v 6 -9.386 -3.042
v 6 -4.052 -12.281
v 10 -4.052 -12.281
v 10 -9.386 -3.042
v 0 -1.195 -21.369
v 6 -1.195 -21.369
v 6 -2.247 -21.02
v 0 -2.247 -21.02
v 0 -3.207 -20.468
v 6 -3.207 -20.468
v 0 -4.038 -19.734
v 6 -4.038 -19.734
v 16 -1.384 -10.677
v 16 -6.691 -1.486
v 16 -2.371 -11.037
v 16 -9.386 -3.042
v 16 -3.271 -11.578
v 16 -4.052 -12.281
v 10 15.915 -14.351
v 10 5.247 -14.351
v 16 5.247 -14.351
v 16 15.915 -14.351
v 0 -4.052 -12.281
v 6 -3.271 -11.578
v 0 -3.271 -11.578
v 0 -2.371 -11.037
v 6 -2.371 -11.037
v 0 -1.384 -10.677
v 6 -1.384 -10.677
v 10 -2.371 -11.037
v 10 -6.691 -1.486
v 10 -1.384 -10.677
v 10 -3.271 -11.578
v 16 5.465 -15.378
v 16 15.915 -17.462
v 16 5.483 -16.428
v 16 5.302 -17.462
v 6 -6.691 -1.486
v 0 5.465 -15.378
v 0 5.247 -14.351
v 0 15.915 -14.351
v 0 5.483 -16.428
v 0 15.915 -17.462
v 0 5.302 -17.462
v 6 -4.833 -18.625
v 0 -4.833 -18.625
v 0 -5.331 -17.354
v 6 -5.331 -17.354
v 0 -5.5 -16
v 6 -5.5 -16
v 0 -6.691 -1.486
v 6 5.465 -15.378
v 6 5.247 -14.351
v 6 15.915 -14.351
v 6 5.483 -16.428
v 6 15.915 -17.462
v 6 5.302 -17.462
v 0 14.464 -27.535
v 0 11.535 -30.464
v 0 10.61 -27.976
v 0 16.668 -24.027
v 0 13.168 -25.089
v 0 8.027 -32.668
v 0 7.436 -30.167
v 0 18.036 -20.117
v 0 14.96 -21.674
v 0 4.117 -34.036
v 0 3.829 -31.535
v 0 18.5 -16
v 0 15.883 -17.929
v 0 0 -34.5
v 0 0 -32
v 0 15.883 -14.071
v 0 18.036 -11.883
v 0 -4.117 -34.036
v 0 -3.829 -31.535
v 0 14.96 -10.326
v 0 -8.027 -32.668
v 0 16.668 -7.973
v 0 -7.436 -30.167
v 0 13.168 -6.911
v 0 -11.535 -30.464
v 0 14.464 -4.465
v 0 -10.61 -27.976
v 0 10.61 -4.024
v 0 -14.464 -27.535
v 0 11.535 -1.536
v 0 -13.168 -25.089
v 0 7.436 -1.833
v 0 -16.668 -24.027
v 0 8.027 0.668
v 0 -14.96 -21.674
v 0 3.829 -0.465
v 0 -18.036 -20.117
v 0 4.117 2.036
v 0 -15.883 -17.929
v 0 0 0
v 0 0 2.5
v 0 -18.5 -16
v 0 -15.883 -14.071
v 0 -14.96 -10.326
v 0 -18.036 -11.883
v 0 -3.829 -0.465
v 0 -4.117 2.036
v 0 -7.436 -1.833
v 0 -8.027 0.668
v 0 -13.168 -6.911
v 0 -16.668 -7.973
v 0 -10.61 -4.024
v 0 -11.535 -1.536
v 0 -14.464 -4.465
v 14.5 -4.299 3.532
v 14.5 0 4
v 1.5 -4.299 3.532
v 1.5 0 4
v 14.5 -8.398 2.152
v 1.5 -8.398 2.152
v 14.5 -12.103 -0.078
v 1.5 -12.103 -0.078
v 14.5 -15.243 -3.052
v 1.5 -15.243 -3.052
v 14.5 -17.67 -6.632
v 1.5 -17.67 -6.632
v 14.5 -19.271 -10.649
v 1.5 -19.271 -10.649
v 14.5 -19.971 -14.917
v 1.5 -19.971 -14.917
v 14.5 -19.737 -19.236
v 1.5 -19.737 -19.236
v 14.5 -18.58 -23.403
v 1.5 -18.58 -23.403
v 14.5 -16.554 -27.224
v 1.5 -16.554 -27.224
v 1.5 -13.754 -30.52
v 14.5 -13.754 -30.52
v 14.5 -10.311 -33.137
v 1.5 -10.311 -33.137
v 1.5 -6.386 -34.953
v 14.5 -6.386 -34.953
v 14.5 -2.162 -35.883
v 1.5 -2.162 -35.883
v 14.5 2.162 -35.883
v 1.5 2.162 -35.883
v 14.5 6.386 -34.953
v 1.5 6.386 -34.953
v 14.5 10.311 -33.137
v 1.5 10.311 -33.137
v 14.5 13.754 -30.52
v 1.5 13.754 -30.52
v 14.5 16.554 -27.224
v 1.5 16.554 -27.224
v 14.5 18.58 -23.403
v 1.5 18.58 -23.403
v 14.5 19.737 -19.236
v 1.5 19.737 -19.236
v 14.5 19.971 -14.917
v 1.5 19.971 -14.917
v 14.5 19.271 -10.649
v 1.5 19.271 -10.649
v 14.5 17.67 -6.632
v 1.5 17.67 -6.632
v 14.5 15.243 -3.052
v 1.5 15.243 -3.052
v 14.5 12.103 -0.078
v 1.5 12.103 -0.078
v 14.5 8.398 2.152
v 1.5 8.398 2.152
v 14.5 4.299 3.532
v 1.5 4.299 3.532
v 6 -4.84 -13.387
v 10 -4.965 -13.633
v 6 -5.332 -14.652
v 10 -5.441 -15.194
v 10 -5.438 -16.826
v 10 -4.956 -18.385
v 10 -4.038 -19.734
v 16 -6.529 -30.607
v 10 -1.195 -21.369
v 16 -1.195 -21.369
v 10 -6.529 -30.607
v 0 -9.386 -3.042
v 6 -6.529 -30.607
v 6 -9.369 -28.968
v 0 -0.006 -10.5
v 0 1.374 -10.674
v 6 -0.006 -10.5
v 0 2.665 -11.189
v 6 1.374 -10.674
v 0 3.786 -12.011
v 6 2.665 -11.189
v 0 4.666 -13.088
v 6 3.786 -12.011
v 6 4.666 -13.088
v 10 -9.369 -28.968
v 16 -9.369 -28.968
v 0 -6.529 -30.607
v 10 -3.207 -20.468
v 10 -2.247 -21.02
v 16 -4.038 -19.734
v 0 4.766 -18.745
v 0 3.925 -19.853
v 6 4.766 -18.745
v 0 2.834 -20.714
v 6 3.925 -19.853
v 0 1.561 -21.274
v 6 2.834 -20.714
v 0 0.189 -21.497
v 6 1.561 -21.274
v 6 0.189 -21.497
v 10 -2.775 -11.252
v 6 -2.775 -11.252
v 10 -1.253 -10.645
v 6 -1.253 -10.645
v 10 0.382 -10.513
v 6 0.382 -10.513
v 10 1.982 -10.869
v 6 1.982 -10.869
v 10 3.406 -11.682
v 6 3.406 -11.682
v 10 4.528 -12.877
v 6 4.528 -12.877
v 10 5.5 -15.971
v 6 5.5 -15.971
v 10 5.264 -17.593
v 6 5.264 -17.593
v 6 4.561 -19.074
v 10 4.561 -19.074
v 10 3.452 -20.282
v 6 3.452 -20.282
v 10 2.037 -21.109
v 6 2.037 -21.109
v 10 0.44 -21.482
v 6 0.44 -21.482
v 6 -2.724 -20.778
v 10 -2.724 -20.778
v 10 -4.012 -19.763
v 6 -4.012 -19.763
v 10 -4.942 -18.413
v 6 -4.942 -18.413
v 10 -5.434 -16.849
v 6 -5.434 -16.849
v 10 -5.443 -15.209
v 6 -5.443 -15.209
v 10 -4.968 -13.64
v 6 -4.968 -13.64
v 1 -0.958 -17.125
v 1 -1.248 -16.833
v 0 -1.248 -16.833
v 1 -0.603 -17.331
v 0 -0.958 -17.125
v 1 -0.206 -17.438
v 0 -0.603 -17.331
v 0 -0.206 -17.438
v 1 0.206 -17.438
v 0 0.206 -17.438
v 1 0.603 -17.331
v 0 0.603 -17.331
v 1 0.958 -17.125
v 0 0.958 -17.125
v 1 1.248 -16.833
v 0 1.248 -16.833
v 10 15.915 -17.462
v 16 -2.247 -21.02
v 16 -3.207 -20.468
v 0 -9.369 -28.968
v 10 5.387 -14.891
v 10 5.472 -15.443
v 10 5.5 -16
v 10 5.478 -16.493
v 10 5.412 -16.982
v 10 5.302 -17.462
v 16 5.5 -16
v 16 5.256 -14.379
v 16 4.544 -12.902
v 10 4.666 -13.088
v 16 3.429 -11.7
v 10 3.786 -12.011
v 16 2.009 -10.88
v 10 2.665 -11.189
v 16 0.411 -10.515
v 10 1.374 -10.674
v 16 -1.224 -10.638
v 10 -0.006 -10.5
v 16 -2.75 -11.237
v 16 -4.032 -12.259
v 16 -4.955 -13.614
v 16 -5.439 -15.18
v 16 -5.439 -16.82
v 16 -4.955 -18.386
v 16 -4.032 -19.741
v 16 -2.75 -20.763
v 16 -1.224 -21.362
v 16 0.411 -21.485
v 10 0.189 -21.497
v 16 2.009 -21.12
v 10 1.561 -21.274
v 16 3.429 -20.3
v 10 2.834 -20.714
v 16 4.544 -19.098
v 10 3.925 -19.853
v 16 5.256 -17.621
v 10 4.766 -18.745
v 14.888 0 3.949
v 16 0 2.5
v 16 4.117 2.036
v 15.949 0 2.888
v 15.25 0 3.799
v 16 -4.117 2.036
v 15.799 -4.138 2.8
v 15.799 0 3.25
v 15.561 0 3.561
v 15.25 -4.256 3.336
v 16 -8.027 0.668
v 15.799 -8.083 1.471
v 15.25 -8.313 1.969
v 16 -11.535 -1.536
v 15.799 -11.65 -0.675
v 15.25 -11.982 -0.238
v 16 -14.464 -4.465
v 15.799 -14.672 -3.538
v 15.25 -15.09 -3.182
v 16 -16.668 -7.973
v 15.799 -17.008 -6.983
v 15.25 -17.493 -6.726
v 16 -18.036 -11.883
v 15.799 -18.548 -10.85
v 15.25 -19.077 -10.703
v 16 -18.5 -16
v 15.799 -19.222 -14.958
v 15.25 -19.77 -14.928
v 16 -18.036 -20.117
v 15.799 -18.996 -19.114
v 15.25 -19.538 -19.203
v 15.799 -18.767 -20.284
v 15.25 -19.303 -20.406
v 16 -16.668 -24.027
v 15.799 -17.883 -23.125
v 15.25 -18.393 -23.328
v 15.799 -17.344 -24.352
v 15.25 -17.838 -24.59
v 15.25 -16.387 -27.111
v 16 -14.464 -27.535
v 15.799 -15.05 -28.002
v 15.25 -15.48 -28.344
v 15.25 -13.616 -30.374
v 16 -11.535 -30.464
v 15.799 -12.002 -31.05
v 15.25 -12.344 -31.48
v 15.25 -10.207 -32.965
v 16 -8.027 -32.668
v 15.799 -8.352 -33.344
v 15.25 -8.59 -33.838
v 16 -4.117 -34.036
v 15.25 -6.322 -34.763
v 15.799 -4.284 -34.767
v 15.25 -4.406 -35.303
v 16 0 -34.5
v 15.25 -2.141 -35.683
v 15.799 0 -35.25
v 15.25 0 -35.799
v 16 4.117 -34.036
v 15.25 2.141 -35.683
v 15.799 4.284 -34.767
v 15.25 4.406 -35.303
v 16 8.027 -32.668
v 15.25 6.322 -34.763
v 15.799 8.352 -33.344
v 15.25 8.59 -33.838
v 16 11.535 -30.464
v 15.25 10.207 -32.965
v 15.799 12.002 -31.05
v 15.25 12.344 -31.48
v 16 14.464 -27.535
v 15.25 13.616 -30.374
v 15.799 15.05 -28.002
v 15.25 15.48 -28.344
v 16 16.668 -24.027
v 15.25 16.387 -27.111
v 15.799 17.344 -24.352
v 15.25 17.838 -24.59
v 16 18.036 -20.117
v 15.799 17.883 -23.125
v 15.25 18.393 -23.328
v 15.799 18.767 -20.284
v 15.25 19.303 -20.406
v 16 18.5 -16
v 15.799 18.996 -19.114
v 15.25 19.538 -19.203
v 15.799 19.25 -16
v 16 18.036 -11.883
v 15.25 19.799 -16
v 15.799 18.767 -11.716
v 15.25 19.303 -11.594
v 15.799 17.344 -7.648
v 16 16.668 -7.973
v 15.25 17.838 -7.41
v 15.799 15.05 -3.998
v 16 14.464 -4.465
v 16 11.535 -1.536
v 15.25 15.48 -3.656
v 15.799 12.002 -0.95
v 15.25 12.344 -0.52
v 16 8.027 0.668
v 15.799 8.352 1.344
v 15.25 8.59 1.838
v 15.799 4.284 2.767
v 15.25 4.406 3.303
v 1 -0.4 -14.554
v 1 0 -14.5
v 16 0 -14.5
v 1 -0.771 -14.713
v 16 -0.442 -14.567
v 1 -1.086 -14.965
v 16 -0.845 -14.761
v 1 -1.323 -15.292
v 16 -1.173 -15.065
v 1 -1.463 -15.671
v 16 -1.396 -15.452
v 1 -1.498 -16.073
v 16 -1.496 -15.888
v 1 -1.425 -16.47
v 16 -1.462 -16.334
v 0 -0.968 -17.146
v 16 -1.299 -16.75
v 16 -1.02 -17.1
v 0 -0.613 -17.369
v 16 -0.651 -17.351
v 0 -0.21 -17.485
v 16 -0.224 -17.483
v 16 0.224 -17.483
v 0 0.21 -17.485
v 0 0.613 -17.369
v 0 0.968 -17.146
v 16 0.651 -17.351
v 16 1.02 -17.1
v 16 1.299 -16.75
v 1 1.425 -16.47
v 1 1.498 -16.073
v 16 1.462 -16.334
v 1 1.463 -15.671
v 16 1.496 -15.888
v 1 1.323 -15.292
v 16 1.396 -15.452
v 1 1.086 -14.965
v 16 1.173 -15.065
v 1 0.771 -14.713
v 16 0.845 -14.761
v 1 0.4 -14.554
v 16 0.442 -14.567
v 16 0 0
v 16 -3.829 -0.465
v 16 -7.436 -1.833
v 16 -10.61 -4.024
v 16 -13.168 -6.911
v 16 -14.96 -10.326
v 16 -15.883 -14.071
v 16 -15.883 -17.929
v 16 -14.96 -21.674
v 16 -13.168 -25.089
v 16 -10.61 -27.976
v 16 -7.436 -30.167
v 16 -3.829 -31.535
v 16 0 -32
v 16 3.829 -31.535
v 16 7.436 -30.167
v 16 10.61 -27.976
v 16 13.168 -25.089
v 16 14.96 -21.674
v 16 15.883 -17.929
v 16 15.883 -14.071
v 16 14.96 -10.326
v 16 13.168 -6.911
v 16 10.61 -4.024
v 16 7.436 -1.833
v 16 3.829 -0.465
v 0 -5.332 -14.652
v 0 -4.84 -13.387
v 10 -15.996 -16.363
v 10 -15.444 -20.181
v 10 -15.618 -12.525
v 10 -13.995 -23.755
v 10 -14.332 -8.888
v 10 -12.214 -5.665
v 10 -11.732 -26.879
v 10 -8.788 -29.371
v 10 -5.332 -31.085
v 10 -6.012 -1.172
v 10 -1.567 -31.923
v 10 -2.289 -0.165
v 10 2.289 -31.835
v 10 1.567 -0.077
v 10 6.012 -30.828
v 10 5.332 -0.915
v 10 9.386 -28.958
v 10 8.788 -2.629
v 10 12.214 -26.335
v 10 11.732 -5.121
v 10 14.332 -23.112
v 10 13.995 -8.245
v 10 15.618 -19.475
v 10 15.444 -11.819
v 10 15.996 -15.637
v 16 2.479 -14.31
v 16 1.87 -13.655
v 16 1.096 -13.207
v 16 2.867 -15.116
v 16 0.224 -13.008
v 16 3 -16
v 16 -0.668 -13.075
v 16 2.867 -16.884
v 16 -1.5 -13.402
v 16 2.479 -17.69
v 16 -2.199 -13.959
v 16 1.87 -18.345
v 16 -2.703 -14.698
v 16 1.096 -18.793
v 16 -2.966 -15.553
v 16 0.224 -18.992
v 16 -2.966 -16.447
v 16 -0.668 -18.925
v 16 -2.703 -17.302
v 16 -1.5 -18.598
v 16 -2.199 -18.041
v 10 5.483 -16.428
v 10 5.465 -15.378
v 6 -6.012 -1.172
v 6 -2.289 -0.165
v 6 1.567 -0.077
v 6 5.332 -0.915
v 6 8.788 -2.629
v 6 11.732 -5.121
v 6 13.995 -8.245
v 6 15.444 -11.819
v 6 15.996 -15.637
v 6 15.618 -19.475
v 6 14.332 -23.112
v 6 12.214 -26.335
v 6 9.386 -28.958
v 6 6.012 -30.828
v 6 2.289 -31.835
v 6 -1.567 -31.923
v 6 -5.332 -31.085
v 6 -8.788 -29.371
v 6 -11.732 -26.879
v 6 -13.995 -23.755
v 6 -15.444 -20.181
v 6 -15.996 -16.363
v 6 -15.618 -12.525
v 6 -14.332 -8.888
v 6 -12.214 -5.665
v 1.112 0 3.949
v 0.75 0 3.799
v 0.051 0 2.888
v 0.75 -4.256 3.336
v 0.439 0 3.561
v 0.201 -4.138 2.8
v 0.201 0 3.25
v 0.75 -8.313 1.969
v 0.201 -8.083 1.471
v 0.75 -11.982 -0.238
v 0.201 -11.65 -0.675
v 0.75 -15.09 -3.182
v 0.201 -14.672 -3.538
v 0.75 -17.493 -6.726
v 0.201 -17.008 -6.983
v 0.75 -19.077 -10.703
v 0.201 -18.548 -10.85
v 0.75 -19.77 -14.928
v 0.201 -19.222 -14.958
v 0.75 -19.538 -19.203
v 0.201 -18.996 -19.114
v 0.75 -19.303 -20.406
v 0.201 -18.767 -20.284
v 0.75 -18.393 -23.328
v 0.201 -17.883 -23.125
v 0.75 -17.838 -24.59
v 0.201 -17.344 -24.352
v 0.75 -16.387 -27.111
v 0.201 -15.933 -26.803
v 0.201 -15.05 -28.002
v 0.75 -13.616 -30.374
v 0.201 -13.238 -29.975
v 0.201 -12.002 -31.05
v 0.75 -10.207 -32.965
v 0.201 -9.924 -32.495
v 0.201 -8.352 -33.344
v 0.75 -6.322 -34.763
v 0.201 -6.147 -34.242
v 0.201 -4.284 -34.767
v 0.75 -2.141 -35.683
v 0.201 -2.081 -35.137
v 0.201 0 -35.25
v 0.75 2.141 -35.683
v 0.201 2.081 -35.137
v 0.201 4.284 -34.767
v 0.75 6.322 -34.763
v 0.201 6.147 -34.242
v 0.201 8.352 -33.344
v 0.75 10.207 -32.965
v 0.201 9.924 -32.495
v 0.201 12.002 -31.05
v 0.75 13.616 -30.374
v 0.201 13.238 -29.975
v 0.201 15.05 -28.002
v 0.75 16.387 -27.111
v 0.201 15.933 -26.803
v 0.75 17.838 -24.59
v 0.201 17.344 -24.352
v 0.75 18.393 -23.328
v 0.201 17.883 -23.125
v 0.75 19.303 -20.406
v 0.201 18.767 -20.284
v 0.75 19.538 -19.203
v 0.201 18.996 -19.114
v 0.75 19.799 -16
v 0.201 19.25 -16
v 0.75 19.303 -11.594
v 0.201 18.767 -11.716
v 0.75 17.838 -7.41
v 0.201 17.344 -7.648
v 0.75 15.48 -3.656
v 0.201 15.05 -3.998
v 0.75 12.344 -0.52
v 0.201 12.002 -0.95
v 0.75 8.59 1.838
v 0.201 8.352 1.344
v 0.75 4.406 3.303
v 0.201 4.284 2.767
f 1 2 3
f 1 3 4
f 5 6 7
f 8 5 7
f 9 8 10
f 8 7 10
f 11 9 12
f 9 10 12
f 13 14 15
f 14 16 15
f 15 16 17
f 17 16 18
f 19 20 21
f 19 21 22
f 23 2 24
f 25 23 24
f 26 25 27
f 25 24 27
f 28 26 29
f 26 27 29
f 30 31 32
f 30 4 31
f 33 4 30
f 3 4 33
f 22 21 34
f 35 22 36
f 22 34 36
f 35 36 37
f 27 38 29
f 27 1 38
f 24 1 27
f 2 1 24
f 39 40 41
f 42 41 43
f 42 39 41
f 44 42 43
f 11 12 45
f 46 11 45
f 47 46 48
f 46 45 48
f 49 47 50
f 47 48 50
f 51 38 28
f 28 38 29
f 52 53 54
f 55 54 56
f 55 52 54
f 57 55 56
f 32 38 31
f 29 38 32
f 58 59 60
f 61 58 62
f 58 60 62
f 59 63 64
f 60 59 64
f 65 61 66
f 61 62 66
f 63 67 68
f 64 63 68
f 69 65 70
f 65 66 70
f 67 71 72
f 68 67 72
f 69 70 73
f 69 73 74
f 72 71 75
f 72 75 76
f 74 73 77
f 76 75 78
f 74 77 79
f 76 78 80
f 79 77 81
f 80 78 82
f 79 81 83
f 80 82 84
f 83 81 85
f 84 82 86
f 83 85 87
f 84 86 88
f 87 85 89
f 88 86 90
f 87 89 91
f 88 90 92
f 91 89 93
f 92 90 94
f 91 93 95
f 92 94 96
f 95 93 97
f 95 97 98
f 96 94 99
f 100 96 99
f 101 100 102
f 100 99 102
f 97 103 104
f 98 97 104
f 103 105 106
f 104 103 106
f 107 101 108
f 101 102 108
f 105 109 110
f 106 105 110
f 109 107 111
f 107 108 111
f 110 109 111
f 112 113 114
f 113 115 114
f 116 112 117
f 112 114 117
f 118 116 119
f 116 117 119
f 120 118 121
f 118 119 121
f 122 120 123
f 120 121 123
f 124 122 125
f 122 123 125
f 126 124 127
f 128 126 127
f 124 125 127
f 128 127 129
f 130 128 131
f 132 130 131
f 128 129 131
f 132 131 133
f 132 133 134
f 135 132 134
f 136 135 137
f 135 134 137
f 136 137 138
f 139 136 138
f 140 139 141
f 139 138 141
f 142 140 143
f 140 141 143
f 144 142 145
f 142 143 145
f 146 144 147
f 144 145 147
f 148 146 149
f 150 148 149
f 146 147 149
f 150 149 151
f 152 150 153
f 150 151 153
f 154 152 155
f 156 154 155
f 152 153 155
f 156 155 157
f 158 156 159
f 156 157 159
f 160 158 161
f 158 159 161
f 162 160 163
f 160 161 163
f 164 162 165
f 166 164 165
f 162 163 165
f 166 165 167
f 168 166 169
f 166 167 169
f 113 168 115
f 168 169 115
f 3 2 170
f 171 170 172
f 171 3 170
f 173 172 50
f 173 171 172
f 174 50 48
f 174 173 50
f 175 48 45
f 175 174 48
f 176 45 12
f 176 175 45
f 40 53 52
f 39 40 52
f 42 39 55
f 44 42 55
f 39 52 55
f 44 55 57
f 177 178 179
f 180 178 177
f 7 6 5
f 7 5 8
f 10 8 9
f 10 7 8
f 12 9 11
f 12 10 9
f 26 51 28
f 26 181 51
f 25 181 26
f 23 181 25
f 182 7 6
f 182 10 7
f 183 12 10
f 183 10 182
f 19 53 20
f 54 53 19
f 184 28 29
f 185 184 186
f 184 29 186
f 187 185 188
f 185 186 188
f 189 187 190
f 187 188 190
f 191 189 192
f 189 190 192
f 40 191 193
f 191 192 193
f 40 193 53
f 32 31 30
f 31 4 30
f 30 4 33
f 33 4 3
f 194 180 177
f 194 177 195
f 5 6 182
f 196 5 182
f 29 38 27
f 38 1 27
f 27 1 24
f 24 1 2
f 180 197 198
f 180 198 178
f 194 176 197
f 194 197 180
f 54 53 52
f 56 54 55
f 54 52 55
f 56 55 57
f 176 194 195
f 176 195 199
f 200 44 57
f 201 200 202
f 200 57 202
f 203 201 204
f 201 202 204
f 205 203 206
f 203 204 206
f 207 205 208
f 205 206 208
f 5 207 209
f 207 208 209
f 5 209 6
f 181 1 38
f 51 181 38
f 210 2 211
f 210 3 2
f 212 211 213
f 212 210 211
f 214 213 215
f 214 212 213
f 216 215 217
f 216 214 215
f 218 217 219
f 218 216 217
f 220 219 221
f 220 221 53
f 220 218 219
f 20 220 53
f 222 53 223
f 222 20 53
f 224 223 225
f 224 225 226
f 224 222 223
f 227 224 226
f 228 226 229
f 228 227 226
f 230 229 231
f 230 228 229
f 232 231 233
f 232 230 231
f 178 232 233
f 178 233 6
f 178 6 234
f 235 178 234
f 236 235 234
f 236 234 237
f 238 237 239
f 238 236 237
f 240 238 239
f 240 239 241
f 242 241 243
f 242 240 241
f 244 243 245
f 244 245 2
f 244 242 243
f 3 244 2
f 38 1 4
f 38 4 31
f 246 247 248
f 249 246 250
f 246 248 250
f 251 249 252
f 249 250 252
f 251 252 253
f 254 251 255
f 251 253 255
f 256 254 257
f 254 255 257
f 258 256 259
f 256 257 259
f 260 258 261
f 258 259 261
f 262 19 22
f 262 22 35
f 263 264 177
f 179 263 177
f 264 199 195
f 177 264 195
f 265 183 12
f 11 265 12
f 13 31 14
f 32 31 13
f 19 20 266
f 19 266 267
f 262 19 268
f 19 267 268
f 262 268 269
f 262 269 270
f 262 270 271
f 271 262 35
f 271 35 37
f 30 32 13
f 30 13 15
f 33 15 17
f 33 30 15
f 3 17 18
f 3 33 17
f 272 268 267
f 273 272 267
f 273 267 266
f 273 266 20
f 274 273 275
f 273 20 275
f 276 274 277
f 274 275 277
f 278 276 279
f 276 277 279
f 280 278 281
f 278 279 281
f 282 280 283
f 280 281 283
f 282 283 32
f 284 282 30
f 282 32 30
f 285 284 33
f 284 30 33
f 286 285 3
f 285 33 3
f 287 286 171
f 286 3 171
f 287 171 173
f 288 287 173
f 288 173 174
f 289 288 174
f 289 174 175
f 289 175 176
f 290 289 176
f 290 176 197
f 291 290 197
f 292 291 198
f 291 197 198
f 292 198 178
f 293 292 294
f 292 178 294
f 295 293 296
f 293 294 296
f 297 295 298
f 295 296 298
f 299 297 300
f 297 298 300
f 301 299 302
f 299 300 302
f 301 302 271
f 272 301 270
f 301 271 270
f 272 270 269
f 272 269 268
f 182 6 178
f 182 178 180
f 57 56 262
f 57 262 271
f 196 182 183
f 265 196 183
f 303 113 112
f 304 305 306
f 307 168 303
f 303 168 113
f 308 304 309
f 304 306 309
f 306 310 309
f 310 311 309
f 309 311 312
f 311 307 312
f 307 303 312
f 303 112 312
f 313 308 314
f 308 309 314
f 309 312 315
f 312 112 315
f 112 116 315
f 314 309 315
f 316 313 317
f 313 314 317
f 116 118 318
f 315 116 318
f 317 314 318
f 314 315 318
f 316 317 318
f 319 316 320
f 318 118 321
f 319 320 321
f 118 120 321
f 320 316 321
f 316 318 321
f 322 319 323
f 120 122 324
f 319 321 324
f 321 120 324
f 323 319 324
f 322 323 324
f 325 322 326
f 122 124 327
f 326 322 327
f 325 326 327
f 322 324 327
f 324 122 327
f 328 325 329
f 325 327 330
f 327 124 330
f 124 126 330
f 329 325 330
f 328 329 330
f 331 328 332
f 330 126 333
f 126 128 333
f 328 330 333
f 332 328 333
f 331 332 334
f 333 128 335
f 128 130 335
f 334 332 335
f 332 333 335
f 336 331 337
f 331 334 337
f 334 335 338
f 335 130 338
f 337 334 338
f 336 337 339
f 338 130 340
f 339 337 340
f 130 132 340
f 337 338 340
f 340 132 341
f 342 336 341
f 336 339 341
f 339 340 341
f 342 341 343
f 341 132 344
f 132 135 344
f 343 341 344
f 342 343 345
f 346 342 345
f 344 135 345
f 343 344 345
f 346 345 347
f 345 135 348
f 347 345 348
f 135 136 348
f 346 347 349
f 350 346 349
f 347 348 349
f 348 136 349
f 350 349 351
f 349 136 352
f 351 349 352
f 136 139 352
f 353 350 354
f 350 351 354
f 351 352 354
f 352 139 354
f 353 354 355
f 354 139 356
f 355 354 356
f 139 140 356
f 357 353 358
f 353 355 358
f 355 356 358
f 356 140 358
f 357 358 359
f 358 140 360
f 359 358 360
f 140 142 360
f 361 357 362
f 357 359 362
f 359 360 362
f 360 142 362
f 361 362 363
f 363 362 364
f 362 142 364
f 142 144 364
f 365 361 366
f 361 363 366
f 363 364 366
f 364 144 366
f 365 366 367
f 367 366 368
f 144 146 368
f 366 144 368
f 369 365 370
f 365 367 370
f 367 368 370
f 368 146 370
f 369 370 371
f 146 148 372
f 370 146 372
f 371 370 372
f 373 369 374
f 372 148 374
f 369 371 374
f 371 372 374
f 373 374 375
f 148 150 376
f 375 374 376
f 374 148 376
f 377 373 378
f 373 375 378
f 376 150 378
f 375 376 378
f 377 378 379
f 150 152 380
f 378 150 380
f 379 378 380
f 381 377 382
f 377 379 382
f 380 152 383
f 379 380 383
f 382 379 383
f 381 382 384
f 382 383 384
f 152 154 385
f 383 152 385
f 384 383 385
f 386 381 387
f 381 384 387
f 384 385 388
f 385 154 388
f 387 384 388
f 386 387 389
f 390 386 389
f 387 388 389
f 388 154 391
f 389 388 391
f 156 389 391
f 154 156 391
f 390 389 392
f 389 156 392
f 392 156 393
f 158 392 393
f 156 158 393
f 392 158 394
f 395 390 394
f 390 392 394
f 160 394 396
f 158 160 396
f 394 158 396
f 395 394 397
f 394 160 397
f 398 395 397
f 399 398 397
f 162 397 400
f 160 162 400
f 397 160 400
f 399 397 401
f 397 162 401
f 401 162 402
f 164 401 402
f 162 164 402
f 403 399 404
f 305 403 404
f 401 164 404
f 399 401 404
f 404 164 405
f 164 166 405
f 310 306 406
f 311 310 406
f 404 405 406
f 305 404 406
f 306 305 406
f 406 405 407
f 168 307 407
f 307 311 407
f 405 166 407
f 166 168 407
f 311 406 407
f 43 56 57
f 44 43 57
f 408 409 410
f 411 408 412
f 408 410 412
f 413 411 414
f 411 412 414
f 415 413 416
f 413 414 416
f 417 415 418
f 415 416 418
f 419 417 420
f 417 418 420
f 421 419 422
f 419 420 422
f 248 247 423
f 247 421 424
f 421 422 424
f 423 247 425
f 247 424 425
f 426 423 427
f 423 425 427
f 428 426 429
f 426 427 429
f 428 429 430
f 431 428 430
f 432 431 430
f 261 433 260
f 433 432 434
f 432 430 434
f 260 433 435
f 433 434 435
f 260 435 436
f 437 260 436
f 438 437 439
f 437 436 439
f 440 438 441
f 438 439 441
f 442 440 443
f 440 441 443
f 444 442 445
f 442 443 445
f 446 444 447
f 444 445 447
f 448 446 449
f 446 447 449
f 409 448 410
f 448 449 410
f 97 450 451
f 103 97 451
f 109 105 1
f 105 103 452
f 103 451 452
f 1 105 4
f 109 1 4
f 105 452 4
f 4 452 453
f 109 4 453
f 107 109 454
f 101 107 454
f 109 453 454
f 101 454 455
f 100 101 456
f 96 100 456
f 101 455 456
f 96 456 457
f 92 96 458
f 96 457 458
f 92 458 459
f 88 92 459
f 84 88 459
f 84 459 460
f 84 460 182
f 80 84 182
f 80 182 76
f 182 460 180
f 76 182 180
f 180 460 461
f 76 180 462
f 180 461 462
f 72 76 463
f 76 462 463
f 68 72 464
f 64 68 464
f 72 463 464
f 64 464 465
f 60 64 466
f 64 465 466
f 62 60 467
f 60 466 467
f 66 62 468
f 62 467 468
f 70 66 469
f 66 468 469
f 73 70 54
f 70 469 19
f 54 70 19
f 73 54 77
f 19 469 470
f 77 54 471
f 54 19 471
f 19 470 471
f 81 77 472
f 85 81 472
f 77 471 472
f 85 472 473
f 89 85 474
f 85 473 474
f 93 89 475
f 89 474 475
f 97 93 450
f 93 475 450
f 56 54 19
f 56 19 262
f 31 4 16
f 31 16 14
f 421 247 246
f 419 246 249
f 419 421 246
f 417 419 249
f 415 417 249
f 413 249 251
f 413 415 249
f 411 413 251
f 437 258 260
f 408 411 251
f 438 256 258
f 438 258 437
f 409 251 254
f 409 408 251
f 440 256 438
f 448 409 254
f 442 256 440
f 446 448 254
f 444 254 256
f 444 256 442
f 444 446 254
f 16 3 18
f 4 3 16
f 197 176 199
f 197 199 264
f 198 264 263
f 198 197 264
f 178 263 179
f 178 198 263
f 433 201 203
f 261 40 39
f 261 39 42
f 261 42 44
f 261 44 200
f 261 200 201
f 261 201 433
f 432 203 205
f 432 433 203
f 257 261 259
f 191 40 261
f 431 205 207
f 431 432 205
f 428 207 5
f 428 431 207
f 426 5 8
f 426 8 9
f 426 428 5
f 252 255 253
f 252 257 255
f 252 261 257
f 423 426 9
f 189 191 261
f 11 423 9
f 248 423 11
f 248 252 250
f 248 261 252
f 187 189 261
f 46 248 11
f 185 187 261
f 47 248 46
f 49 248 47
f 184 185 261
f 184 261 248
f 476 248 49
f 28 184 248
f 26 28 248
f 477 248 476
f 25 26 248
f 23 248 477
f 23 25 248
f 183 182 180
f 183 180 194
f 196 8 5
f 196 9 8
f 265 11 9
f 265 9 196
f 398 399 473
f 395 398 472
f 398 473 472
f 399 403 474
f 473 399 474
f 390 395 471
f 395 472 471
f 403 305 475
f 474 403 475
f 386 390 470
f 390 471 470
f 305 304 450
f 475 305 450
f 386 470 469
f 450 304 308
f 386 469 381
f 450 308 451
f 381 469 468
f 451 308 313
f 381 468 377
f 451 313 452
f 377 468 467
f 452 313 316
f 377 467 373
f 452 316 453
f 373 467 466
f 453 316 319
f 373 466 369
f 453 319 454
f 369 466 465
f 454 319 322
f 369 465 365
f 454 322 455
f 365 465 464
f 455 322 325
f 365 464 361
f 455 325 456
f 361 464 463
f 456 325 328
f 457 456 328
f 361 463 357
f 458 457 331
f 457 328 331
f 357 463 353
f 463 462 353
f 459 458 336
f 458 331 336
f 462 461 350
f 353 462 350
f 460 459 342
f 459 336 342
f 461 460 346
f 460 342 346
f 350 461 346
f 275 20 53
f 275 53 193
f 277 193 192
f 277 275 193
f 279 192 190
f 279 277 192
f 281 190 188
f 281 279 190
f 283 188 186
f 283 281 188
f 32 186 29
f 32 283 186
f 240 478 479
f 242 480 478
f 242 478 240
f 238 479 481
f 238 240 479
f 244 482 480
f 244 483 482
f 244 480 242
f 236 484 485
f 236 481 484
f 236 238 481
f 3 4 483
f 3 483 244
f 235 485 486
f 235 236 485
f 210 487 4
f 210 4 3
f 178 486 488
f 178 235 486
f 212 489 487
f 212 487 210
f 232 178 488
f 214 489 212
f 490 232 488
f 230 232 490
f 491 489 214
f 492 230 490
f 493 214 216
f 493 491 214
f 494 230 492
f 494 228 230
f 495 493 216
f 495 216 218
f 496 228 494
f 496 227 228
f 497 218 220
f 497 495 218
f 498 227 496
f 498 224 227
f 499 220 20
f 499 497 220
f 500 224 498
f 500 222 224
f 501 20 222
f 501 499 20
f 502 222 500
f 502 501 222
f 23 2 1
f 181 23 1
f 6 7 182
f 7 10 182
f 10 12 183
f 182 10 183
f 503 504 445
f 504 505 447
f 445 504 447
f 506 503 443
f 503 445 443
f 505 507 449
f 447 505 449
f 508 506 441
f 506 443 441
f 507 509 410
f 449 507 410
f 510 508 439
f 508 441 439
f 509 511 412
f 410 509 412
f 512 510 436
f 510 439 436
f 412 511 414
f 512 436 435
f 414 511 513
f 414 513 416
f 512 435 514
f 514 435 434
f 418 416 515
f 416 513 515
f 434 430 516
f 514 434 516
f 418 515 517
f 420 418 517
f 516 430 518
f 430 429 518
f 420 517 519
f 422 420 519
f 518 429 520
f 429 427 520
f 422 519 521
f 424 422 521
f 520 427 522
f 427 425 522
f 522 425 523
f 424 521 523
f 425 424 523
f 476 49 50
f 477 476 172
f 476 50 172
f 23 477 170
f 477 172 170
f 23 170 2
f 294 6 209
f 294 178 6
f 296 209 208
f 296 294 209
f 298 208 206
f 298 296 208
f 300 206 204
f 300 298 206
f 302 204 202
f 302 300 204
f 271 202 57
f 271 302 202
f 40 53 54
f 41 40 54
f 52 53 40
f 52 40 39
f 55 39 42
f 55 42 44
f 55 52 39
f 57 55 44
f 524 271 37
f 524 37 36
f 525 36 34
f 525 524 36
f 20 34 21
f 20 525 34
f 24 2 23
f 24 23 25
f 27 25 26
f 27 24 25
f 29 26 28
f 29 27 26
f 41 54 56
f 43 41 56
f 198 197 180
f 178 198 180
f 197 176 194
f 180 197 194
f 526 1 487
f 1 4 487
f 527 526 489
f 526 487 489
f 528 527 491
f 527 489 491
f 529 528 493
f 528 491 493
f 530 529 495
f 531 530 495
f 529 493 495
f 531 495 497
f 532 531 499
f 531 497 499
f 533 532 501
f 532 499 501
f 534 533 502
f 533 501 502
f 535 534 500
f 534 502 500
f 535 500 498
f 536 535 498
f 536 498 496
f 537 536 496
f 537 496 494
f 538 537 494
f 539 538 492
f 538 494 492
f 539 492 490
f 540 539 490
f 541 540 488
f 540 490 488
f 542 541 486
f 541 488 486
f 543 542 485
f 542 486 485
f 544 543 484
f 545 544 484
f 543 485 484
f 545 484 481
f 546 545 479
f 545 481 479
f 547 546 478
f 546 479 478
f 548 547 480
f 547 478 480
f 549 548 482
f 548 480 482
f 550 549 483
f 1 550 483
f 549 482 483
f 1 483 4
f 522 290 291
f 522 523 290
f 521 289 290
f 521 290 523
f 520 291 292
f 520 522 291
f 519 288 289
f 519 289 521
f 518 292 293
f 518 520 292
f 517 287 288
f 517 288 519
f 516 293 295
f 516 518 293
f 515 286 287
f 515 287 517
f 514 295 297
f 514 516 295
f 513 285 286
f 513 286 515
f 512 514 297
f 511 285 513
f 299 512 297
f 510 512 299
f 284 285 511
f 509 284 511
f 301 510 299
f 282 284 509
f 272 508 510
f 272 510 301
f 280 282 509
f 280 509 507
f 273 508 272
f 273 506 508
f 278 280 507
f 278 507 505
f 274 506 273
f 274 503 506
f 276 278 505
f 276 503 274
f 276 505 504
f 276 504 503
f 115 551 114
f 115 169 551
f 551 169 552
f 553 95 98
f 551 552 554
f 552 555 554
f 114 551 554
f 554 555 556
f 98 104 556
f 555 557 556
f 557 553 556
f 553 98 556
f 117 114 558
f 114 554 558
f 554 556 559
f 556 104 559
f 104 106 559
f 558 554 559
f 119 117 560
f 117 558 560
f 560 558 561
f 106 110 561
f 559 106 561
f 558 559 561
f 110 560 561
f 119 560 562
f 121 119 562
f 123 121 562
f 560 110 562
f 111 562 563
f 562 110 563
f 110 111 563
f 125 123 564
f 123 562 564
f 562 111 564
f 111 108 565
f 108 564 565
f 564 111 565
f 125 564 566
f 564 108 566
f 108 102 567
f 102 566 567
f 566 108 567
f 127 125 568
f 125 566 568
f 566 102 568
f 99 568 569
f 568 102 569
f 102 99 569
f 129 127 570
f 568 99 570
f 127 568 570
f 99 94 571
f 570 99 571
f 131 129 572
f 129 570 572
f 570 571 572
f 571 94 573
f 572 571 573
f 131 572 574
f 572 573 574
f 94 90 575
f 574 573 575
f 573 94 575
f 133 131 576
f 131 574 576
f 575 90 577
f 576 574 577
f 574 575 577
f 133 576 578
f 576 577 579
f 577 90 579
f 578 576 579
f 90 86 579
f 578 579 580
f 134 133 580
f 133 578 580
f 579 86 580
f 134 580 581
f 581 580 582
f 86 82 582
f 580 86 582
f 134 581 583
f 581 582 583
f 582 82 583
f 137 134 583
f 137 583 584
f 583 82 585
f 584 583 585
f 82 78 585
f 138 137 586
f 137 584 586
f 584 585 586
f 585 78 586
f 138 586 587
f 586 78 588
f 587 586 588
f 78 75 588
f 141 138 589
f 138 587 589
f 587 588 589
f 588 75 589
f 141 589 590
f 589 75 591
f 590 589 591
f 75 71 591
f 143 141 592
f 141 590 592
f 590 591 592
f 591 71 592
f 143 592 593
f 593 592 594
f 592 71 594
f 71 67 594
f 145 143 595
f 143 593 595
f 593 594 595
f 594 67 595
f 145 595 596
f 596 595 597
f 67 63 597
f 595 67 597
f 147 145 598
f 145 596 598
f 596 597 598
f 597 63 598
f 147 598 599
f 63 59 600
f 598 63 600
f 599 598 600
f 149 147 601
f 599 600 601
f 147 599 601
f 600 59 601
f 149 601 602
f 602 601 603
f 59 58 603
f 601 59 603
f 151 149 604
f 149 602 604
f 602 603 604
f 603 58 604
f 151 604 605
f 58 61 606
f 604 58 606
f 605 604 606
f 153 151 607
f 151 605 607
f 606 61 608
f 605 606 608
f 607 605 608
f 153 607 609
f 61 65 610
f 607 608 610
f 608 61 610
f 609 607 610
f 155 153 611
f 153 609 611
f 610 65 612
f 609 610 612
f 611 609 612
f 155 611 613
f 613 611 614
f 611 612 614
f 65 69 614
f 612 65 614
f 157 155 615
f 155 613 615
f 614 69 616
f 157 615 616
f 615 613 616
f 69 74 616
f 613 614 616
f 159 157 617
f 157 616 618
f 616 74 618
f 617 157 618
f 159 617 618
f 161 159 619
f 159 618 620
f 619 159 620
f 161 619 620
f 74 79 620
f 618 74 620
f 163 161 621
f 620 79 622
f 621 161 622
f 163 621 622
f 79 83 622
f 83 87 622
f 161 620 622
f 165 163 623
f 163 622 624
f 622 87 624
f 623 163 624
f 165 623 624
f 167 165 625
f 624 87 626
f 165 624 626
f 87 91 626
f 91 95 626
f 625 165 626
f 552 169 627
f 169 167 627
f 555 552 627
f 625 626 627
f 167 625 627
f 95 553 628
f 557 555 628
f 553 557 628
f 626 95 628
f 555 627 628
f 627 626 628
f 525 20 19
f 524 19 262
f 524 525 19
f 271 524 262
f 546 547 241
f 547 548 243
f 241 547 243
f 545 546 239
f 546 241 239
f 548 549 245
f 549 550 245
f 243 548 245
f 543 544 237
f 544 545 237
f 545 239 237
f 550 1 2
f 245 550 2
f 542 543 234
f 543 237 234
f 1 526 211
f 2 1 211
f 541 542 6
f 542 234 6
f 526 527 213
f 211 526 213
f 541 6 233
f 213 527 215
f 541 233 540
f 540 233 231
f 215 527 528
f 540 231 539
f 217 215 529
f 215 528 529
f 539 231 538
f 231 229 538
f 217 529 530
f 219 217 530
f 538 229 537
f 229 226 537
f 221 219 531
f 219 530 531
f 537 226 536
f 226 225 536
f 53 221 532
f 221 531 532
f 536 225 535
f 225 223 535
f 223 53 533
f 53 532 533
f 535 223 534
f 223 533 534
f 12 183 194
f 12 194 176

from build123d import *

# Parameters (mm, degrees)
F0_W       = 4
F0_H       = 1.5
F0_W_2     = 6
F0_H_2     = 2.5
F3_DEPTH   = 4
F4_R       = 1.5666851265
F5_DEPTH   = 1
F6_R       = 3
F7_DEPTH   = 6
F8_R       = 5.5
F8_R_2     = 3
F9_DEPTH   = 6
F3_FACE1_W = 4
F3_FACE1_H = 10.6678811696
F11_DEPTH  = 6
F12_DEPTH  = 6


with BuildPart() as f1:
    # F0 (on Front) → F1 (revolve)
    with BuildSketch(Plane.XZ):
        with BuildLine():
            Line((0, 2.5), (0, 0))
            Line((0, 0), (6, 0))
            Line((6, 0), (10, 0))
            Line((10, 0), (16, 0))
            Line((16, 0), (16, 2.5))
            ThreePointArc((16, 2.5), (15.5606601718, 3.5606601718), (14.5, 4))
            Line((14.5, 4), (1.5, 4))
            ThreePointArc((1.5, 4), (0.4393398282, 3.5606601718), (0, 2.5))
        make_face()
        with Locations((8, -13.75)):
            Rectangle(F0_W, F0_H)
        with Locations((3, -13.75)):
            Rectangle(F0_W_2, F0_H)
        with Locations((8, -11.75)):
            Rectangle(F0_W, F0_H_2)
        with Locations((13, -13.75)):
            Rectangle(F0_W_2, F0_H)
    revolve(axis=Axis((8, 0, -16), (1, 0, 0)))

    # F2 (on face) → F3 (join)
    with BuildSketch(Plane(origin=(6, 0, 0), x_dir=(0, -1, 0), z_dir=(-1, 0, 0))):
        with BuildLine():
            Line((6.6908253366, -1.4861596642), (1.3844372123, -10.6770935002))
            ThreePointArc((1.3844372123, -10.6770935002), (2.8339033039, -11.2862974145), (4.051778006, -12.2807131073))
            Line((4.051778006, -12.2807131073), (9.3857185908, -3.0420570099))
            Line((9.3857185908, -3.0420570099), (6.6908253366, -1.4861596642))
        make_face()
        with BuildLine():
            ThreePointArc((4.037854872, -19.7343979479), (2.741097896, -20.7682682731), (1.1951079301, -21.36858613))
            Line((1.1951079301, -21.36858613), (6.5290485149, -30.6072422274))
            Line((6.5290485149, -30.6072422274), (9.3687329614, -28.9677496478))
            Line((9.3687329614, -28.9677496478), (4.037854872, -19.7343979479))
        make_face()
        with BuildLine():
            ThreePointArc((-5.3019908569, -17.4624954541), (-5.4991378368, -15.9026190397), (-5.246885936, -14.3507007627))
            Line((-5.246885936, -14.3507007627), (-15.9147671056, -14.3507007627))
            Line((-15.9147671056, -14.3507007627), (-15.9147671056, -17.4624954541))
            Line((-15.9147671056, -17.4624954541), (-5.3019908569, -17.4624954541))
        make_face()
    extrude(amount=-F3_DEPTH)

    # F4 (on Right) → F5 (join)
    with BuildSketch(Plane.YZ):
        with Locations((0, -15.8851090819)):
            Circle(F4_R)
    extrude(amount=F5_DEPTH)

    # F6 (on face) → F7 (join)
    with BuildSketch(Plane(origin=(6, 0, 0), x_dir=(0, -1, 0), z_dir=(-1, 0, 0))):
        with BuildLine():
            ThreePointArc((4.037854872, -19.7343979479), (5.1214354333, -18.0052179687), (5.5, -16))
            ThreePointArc((5.5, -16), (5.1251721451, -14.0043521143), (4.051778006, -12.2807131073))
            ThreePointArc((4.051778006, -12.2807131073), (2.8339033039, -11.2862974145), (1.3844372123, -10.6770935002))
            ThreePointArc((1.3844372123, -10.6770935002), (-2.665234533, -11.1889164542), (-5.246885936, -14.3507007627))
            ThreePointArc((-5.246885936, -14.3507007627), (-5.4991378368, -15.9026190397), (-5.3019908569, -17.4624954541))
            ThreePointArc((-5.3019908569, -17.4624954541), (-2.8339033039, -20.7137025855), (1.1951079301, -21.36858613))
            ThreePointArc((1.1951079301, -21.36858613), (2.741097896, -20.7682682731), (4.037854872, -19.7343979479))
        make_face()
        with Locations((0, -16)):
            Circle(F6_R, mode=Mode.SUBTRACT)
    extrude(amount=F7_DEPTH)

    # F8 (on face) → F9 (join)
    with BuildSketch(Plane.YZ.offset(10)):
        with Locations((0, -16)):
            Circle(F8_R)
        with Locations((0, -16)):
            Circle(F8_R_2, mode=Mode.SUBTRACT)
    extrude(amount=F9_DEPTH)


with BuildPart() as f10:
    # F3_face1 (on face) → F10 (revolve)
    with BuildSketch(Plane(origin=(8, -6.7187482984, -7.6613850586), x_dir=(1, 0, 0), z_dir=(0, -0.8660254038, -0.5))):
        Rectangle(F3_FACE1_W, F3_FACE1_H)
    revolve(axis=Axis((10, 0, -16), (-1, 0, 0)))


with BuildPart() as f11:
    # F11 (new): faces of the model
    f11_faces = [f1.part.faces().sort_by_distance(p)[0] for p in [
        (6, 10.6696132386, -15.9052587497),
        (6, -5.4168549489, -6.8072145119),
        (6, -5.324286083, -25.2418602225),
    ]]
    extrude(f11_faces, amount=F11_DEPTH)


with BuildPart() as f12:
    # F12 (new): faces of the model
    f12_faces = [f1.part.faces().sort_by_distance(p)[0] for p in [
        (10, -5.4168549489, -6.8072145119),
        (10, -5.324286083, -25.2418602225),
        (10, 10.6696132386, -15.9052587497),
    ]]
    extrude(f12_faces, amount=F12_DEPTH)


solid = Compound([f1.part, f10.part, f11.part, f12.part])
